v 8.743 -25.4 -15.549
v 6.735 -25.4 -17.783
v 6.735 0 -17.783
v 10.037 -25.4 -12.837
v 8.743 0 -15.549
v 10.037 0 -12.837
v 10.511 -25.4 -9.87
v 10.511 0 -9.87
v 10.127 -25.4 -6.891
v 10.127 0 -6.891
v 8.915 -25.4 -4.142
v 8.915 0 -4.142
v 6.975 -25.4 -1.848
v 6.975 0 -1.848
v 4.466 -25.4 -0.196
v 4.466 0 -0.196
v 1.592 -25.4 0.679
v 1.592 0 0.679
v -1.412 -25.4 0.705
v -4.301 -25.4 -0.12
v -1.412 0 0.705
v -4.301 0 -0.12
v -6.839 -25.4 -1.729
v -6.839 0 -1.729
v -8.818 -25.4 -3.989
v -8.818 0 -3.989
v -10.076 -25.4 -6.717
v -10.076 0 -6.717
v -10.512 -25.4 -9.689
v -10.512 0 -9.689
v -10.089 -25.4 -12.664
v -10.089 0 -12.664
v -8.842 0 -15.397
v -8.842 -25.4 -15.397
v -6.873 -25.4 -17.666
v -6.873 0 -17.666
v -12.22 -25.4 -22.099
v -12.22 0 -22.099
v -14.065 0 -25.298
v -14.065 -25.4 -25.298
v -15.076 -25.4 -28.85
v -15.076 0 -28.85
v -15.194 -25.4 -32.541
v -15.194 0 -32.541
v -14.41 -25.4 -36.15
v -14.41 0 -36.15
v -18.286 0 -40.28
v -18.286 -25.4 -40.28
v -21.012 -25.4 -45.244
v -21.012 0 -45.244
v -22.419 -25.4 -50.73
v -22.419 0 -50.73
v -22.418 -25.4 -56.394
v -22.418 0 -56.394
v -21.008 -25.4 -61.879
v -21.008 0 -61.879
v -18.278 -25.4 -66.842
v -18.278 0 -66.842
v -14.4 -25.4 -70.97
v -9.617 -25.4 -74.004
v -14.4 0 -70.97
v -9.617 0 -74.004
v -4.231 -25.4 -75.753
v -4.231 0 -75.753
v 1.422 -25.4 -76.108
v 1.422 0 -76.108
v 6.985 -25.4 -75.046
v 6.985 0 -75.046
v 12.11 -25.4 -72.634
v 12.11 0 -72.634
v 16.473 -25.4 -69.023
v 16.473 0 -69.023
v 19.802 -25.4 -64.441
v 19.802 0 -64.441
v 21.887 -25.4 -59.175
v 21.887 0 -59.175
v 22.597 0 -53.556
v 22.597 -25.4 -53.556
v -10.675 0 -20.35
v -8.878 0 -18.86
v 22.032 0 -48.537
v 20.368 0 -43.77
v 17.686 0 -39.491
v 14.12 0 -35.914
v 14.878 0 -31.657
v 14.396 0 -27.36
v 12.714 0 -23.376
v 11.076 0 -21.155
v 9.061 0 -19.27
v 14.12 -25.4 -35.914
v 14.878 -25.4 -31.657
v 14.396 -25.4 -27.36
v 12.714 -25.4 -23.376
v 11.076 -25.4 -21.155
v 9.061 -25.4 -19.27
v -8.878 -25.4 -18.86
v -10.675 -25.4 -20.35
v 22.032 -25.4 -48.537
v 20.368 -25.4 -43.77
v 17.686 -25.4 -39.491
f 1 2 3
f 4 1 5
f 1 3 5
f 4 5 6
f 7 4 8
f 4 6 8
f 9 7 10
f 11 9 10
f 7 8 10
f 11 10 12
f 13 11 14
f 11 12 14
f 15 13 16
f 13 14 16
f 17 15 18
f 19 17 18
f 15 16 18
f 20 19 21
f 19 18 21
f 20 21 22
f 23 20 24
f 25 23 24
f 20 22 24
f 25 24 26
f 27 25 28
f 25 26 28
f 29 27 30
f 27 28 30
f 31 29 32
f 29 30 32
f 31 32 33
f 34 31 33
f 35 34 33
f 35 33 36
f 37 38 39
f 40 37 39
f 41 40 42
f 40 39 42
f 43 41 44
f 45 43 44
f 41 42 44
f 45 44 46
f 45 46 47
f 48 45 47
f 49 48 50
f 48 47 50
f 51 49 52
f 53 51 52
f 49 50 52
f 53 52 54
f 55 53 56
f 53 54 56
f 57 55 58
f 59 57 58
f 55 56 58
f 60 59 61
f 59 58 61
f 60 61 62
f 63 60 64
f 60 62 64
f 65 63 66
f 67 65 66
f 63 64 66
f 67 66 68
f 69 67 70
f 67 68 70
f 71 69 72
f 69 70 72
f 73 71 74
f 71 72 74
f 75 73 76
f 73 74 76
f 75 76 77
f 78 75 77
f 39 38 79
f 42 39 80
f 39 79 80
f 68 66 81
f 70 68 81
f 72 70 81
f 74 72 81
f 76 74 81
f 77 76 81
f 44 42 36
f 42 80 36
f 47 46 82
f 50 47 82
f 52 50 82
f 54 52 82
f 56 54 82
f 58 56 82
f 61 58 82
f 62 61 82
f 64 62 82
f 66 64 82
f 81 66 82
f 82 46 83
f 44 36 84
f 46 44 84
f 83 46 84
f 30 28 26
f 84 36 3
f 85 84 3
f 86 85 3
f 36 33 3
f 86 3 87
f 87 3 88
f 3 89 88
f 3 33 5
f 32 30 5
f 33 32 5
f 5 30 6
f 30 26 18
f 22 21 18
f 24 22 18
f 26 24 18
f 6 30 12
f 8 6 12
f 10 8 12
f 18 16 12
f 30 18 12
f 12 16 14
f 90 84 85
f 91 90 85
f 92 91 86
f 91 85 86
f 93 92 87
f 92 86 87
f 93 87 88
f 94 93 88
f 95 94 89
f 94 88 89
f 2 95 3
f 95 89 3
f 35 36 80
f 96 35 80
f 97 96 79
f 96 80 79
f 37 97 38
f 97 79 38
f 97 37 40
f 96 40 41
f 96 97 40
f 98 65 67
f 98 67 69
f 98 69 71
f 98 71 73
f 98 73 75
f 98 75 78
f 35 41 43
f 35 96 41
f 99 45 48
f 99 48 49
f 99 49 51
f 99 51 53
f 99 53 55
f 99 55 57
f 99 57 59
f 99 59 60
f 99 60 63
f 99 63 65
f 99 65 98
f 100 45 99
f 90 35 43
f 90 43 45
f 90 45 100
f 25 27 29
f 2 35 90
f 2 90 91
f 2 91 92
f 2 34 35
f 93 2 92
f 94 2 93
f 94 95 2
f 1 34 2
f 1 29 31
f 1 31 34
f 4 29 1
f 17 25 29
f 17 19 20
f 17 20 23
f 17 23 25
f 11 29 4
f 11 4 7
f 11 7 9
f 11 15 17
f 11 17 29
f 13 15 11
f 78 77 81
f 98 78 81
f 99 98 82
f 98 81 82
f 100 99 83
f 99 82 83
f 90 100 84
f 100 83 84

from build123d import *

# Parameters (mm, degrees)
F1_DEPTH = 25.4


with BuildPart() as f1:
    # F0 (on Front) → F1 (new body)
    with BuildSketch(Plane.XZ):
        with BuildLine():
            ThreePointArc((-14.4099858393, -36.15015585), (-9.6174010791, -74.0035828929), (22.5965727608, -53.5558275878))
            ThreePointArc((22.5965727608, -53.5558275878), (20.3675773267, -43.7697714683), (14.1203409545, -35.9143686951))
            ThreePointArc((14.1203409545, -35.9143686951), (-0.1867416275, -30.9600264713), (-14.4099858393, -36.15015585))
        make_face()
        with BuildLine():
            ThreePointArc((-14.4099858393, -36.15015585), (-0.1867416275, -30.9600264713), (14.1203409545, -35.9143686951))
            ThreePointArc((14.1203409545, -35.9143686951), (14.7921035223, -29.4911375194), (12.7136237721, -23.3764759904))
            ThreePointArc((12.7136237721, -23.3764759904), (10.1115297439, -20.1661301682), (6.7352958132, -17.7832205863))
            ThreePointArc((6.7352958132, -17.7832205863), (-0.0550758769, -16.1010168), (-6.8734396529, -17.6659042354))
            ThreePointArc((-6.8734396529, -17.6659042354), (-9.8053911529, -19.5704448334), (-12.2196112726, -22.0993093418))
            ThreePointArc((-12.2196112726, -22.0993093418), (-15.0762108242, -28.8501475286), (-14.4099858393, -36.15015585))
        make_face()
        with BuildLine():
            ThreePointArc((-6.8734396529, -17.6659042354), (-0.0550758769, -16.1010168), (6.7352958132, -17.7832205863))
            ThreePointArc((6.7352958132, -17.7832205863), (0.0906184951, 0.7995784888), (-6.8734396529, -17.6659042354))
        make_face()
    extrude(amount=F1_DEPTH)


solid = f1.part
